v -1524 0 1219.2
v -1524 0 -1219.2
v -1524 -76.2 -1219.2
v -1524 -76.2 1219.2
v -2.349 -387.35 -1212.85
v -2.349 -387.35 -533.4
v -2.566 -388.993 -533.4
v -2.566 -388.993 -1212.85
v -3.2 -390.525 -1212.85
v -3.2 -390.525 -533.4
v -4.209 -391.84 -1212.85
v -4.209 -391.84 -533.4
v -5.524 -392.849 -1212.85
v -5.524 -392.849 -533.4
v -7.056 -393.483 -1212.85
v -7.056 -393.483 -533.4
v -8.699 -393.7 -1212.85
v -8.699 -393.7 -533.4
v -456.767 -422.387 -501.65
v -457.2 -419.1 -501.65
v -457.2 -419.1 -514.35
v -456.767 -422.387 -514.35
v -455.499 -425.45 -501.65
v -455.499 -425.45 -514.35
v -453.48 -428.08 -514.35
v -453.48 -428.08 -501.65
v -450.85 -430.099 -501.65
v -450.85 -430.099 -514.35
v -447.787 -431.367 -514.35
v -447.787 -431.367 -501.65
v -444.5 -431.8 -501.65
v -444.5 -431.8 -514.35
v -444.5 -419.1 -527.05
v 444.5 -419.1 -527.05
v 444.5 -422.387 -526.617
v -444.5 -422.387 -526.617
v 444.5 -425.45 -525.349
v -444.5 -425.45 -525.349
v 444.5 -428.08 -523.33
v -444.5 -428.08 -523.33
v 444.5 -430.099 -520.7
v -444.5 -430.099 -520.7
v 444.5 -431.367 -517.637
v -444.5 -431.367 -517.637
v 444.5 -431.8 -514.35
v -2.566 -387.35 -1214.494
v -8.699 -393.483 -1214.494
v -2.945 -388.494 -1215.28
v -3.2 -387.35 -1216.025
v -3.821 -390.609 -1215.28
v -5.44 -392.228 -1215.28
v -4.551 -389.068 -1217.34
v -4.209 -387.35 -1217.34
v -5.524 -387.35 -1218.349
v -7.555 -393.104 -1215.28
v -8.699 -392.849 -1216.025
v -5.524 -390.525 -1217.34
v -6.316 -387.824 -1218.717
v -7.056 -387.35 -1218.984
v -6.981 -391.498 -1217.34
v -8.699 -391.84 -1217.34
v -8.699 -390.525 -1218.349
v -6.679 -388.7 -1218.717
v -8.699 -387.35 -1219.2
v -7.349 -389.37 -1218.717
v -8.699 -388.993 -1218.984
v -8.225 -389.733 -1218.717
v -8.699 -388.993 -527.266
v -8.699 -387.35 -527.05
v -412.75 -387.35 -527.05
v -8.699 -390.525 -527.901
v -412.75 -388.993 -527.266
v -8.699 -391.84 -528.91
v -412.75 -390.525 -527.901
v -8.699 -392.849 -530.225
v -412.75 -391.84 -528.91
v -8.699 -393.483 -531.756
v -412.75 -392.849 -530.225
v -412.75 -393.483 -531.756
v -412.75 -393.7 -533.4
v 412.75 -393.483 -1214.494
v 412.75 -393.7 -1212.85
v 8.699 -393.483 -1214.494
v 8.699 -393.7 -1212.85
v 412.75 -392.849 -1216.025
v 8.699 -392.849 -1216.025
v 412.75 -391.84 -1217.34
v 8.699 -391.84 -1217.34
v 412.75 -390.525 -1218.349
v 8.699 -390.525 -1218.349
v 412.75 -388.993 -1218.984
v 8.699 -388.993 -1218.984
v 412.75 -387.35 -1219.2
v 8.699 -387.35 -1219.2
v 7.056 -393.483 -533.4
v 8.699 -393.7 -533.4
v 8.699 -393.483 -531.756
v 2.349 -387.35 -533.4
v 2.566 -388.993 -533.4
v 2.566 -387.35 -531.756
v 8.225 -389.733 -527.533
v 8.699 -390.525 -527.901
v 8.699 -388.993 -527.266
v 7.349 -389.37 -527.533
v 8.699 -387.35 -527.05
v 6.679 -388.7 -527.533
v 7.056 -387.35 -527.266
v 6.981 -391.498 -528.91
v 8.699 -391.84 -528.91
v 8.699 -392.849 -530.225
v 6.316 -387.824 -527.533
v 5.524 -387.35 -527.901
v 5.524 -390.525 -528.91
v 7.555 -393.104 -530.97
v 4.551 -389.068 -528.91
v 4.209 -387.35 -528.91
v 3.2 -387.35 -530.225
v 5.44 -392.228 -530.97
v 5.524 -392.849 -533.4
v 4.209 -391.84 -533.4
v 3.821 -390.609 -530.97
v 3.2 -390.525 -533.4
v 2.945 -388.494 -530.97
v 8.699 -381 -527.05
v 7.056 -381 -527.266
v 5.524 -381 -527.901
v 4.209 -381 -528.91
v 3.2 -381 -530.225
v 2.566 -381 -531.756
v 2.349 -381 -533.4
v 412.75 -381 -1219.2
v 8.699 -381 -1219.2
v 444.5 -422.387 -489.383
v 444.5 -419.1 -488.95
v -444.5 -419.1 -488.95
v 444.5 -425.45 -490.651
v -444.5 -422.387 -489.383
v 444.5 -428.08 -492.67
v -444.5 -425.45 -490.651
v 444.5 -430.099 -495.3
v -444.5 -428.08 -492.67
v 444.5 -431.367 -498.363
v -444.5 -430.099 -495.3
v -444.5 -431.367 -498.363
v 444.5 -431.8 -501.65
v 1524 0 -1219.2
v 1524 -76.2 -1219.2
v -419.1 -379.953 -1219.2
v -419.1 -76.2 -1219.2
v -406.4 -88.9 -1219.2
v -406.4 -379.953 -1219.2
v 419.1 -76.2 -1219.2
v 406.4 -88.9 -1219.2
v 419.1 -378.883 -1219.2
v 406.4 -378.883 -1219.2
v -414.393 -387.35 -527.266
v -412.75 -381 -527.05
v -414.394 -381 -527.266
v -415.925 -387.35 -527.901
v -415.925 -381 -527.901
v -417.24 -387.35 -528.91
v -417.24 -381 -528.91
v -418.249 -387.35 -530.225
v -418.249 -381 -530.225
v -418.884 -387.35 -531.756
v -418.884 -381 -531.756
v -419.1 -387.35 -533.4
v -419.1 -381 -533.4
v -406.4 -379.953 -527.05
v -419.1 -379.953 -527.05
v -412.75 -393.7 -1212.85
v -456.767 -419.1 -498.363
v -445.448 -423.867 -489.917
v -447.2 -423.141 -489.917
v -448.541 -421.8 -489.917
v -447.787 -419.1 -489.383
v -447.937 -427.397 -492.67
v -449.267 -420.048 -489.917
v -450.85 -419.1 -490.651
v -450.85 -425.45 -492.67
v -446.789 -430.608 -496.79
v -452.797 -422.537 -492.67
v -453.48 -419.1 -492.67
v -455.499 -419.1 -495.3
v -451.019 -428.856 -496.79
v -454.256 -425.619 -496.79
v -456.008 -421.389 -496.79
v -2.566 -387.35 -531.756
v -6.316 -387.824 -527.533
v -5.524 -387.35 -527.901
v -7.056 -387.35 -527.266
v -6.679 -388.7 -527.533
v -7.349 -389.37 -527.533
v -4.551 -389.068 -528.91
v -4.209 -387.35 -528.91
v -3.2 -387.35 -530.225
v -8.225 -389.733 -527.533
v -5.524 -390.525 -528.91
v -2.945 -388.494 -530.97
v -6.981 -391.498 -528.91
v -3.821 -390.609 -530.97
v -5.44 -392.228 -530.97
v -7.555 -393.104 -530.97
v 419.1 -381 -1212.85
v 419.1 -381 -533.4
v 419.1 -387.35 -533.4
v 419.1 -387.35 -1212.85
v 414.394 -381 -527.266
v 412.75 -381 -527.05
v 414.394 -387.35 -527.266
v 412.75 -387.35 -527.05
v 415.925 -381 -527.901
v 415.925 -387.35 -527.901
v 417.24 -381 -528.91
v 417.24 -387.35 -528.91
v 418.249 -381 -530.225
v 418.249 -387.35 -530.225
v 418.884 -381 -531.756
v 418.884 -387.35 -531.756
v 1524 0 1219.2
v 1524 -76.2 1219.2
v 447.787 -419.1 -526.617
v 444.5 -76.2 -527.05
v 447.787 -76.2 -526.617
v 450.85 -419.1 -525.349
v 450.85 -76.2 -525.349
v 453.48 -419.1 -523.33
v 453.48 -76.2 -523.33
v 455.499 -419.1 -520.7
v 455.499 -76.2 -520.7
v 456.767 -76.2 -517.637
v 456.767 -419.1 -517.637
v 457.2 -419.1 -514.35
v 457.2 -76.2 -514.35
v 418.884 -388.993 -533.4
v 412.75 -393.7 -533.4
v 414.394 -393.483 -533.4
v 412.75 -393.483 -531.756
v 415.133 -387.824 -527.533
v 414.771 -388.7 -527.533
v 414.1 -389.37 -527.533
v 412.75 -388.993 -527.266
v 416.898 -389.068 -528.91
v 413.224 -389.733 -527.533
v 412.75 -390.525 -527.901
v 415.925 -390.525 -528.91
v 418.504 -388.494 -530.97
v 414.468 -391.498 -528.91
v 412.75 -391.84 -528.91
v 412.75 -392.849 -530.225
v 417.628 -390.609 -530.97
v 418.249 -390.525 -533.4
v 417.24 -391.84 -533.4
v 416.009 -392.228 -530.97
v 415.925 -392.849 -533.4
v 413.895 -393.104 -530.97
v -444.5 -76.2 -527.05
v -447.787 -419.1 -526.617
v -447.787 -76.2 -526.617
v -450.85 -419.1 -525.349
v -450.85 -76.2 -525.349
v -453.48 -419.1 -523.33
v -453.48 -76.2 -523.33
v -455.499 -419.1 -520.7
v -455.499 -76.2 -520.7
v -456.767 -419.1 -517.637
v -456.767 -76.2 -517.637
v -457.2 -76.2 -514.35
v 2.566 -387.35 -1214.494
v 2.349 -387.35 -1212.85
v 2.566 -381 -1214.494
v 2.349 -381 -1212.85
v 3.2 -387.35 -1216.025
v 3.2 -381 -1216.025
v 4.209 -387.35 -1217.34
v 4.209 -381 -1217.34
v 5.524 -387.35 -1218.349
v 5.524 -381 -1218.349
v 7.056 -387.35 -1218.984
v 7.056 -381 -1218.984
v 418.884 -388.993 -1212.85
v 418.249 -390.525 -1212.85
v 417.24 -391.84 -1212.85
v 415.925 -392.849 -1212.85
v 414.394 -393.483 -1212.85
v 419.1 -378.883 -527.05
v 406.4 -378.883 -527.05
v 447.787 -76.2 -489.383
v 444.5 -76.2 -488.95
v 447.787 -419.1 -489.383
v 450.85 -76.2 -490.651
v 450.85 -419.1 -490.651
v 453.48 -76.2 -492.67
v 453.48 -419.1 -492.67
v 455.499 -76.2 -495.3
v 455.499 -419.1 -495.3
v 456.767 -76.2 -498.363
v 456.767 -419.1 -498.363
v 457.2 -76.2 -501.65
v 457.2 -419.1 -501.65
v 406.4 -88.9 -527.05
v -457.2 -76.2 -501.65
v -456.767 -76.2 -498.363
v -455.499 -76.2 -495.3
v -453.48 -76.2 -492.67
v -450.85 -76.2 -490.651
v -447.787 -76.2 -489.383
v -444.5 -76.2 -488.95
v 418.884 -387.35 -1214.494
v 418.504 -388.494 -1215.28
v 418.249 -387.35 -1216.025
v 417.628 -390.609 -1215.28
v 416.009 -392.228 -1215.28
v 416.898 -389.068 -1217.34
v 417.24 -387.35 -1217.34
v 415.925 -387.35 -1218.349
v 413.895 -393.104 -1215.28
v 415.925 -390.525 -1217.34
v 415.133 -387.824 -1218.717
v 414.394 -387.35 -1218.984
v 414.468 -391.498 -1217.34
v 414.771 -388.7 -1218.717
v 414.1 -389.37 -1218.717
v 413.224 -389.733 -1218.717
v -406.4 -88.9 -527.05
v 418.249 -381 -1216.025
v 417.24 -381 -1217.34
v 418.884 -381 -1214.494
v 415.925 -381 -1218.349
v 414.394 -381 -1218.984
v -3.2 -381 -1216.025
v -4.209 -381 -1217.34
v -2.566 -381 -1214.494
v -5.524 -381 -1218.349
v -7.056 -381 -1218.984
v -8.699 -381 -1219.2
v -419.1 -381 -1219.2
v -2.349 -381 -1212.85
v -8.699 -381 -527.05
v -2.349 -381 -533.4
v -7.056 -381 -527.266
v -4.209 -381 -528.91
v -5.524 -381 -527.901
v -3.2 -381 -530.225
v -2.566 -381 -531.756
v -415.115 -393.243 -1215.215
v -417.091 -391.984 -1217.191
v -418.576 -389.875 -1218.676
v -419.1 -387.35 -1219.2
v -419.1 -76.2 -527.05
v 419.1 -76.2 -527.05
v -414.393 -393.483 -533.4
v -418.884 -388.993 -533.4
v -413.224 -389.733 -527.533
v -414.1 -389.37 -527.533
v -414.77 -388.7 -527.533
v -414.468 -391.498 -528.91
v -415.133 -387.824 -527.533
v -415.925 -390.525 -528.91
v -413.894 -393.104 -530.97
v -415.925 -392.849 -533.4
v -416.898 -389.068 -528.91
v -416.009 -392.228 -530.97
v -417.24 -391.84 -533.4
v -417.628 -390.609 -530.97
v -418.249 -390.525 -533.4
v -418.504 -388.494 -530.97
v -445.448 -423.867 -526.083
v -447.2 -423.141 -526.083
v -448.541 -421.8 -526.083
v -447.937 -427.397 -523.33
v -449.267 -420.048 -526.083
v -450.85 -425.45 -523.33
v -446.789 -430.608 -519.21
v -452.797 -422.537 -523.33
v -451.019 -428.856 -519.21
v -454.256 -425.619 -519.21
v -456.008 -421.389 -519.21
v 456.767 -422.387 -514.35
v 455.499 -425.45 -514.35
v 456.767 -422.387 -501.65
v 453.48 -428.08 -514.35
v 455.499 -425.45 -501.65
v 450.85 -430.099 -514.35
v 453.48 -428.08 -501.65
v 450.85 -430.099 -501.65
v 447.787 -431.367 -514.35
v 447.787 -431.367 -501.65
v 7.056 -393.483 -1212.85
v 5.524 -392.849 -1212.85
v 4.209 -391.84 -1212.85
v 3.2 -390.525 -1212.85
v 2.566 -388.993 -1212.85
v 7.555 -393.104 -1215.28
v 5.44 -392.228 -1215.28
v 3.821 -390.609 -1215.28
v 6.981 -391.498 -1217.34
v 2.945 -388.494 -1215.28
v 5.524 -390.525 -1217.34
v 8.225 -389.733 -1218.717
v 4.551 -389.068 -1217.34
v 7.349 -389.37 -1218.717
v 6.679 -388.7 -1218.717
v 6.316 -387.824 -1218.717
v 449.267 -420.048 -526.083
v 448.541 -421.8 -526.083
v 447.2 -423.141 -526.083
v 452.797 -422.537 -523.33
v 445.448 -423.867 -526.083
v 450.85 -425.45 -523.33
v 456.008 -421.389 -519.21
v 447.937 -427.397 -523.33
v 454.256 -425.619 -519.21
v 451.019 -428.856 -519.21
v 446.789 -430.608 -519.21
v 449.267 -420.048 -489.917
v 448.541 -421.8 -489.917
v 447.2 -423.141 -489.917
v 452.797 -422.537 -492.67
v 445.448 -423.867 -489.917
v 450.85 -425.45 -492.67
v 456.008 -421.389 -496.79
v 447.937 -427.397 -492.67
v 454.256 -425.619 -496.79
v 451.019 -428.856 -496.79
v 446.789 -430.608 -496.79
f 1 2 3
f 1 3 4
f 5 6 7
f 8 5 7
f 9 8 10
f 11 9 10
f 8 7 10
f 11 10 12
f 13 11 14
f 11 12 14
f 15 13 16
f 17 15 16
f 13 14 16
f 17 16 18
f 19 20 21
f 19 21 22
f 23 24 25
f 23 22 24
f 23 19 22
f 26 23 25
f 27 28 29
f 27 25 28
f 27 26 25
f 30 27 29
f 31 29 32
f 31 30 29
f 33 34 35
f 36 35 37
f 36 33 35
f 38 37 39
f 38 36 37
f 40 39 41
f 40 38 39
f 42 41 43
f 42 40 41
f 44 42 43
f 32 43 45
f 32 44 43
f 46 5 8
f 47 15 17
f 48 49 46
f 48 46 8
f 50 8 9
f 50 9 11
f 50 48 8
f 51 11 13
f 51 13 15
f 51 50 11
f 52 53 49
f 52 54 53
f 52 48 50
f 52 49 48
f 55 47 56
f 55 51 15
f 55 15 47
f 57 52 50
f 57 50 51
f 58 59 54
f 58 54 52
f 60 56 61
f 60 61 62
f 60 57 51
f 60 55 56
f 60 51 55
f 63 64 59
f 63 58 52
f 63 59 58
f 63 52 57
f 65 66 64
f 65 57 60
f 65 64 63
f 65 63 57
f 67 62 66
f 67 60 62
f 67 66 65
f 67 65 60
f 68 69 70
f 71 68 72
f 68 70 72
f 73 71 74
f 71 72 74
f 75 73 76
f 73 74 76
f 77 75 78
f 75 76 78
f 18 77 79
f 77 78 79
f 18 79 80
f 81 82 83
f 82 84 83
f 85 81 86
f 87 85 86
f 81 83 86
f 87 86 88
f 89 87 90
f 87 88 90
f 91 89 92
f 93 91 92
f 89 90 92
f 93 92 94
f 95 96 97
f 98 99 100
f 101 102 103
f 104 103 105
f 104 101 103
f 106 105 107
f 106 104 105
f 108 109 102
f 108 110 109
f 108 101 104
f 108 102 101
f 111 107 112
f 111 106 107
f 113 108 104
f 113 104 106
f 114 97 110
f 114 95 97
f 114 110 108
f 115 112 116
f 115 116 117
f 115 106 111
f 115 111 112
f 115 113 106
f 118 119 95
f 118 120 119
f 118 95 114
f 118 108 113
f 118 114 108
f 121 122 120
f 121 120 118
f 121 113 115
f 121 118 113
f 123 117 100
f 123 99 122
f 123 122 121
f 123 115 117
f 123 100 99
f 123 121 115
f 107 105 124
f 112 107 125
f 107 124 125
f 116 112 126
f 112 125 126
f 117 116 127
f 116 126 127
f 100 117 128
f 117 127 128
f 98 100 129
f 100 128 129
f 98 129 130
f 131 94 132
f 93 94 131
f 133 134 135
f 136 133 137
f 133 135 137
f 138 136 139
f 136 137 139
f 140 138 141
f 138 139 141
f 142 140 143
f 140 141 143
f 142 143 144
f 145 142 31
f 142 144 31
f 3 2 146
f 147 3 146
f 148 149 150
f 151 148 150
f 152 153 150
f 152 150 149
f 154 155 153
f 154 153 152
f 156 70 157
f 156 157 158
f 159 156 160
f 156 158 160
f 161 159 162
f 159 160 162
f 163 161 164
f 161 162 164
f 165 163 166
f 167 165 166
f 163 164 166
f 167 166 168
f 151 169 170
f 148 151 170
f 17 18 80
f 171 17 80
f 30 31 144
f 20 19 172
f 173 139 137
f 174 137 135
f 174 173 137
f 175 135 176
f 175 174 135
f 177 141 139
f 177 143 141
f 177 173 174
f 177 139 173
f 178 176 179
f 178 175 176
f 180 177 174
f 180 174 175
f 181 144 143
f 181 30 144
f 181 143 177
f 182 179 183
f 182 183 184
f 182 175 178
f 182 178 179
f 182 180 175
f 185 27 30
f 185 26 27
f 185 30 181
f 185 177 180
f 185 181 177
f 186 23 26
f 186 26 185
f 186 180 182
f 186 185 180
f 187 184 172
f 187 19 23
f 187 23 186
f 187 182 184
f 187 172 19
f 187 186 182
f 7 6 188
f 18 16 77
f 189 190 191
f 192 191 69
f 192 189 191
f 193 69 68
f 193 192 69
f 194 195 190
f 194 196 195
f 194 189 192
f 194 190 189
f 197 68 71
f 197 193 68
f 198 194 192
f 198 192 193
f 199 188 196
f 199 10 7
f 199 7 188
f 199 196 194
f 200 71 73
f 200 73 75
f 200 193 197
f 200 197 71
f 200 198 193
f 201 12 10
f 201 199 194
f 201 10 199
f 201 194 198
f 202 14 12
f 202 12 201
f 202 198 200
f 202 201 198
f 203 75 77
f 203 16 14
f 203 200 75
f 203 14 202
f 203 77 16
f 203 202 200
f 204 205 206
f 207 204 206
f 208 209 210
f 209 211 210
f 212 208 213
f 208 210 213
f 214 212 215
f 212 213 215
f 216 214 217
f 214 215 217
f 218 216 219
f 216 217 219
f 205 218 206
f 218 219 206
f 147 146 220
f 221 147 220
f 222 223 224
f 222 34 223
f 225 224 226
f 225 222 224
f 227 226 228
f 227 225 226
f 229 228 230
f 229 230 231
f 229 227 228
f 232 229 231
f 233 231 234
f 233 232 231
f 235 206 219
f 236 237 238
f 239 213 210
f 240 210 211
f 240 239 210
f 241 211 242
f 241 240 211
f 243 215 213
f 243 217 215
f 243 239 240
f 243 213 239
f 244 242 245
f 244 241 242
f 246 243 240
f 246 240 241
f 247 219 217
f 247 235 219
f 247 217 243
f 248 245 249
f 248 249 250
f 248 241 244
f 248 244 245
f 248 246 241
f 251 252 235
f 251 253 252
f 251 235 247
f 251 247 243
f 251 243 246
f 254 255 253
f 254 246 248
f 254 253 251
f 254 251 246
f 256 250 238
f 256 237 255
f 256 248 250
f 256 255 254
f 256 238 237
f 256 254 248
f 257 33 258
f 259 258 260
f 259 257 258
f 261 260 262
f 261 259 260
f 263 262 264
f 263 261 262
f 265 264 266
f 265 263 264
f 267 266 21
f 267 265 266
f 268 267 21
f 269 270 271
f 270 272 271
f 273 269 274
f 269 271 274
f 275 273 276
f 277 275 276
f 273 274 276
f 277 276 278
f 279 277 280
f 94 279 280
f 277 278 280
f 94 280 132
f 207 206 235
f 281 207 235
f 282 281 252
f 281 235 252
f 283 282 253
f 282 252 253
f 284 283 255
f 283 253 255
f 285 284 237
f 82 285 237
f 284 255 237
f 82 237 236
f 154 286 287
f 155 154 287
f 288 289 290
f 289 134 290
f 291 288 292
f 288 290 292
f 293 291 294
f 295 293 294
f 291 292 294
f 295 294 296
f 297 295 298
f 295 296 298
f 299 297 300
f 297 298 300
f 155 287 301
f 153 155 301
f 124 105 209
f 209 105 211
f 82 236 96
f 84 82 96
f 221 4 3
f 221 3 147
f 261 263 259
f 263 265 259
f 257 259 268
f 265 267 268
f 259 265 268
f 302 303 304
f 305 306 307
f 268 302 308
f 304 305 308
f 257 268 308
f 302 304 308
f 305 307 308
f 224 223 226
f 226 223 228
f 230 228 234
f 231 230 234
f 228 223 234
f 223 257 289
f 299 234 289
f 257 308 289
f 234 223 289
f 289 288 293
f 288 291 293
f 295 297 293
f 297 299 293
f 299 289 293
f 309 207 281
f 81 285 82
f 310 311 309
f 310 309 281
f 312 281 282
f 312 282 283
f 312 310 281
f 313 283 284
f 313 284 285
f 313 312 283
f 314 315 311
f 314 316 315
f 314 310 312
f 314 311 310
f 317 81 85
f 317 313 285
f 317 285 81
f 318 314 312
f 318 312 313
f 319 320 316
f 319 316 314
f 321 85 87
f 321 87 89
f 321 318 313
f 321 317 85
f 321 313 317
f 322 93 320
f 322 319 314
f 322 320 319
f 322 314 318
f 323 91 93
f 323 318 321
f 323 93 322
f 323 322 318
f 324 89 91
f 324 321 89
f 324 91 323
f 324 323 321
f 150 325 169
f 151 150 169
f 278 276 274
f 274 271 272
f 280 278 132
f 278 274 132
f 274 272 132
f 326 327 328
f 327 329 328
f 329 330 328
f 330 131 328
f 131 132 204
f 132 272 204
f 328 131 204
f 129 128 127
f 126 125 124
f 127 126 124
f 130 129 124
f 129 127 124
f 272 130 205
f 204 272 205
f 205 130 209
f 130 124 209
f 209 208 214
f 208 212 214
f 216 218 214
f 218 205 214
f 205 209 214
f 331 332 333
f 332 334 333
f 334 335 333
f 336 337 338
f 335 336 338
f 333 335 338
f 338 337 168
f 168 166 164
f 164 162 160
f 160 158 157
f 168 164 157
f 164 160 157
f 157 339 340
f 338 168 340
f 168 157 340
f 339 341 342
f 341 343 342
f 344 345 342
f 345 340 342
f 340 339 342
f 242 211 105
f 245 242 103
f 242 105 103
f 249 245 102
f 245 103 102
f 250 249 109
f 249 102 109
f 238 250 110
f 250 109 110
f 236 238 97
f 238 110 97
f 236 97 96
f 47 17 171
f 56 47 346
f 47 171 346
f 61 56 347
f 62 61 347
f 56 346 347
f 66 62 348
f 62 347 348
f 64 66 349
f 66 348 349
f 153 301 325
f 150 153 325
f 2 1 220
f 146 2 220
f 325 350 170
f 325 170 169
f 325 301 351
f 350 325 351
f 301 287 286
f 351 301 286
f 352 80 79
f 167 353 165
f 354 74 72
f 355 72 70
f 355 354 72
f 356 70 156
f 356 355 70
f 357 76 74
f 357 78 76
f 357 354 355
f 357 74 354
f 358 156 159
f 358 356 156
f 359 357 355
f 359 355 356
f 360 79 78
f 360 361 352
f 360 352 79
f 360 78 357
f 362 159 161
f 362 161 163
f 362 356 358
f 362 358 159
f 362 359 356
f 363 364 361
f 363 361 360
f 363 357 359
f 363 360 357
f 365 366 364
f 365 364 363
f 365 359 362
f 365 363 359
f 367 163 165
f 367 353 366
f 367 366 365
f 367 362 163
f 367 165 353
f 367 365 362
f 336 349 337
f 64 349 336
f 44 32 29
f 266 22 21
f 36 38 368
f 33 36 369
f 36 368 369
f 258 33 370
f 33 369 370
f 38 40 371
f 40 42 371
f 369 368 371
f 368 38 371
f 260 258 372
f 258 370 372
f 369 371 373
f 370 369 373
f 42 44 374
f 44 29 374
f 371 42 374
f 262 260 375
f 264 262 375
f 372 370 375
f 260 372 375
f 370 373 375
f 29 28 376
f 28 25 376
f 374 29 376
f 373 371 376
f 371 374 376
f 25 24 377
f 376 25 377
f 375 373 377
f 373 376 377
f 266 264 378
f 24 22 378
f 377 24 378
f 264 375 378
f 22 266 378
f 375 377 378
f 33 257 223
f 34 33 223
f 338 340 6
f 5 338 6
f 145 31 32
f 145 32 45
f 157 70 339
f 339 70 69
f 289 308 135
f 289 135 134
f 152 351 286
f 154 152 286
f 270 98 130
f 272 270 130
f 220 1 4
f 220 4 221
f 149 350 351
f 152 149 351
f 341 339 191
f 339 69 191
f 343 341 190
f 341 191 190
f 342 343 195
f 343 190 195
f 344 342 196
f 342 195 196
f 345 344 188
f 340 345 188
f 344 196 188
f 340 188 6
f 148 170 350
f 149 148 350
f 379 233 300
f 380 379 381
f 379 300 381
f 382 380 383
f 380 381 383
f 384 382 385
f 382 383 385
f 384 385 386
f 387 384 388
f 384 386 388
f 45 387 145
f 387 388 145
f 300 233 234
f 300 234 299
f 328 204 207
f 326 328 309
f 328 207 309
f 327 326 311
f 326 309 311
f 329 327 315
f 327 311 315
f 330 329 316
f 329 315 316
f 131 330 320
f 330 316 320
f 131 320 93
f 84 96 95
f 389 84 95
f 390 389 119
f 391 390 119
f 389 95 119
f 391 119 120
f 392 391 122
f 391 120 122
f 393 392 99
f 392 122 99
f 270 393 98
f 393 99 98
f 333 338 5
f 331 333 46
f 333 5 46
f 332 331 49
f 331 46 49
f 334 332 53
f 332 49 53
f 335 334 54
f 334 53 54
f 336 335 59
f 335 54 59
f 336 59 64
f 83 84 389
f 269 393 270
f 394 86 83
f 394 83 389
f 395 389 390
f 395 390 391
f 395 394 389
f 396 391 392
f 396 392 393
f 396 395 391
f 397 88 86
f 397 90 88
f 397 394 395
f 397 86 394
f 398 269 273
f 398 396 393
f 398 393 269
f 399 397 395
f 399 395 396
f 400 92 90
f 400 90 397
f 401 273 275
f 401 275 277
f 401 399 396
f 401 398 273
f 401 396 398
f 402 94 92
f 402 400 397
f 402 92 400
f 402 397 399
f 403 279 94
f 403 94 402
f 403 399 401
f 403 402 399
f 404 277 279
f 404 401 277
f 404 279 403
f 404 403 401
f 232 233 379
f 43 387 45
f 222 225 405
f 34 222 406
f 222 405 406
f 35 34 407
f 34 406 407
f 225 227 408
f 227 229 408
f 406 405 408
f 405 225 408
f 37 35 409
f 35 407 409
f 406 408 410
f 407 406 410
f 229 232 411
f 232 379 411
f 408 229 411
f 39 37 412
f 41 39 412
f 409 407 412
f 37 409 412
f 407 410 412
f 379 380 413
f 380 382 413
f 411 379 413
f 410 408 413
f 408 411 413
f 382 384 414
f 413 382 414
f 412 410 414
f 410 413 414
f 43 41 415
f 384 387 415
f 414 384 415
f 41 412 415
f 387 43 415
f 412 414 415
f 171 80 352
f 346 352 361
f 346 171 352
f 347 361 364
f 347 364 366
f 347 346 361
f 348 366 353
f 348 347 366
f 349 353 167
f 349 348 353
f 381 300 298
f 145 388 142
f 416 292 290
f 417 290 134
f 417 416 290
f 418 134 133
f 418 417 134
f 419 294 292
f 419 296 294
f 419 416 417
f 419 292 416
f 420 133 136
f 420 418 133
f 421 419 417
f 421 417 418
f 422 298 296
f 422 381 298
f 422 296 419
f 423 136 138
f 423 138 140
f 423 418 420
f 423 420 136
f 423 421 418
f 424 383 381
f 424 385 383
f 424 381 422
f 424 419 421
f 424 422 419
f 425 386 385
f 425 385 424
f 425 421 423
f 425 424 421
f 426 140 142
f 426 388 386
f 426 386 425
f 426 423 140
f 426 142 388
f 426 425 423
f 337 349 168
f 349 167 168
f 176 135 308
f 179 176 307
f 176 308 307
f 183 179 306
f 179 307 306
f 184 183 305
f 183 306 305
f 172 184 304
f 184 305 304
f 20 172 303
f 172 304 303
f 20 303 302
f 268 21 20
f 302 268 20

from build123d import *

# Parameters (mm, degrees)
F0_W     = 3048
F0_H     = 2438.4
F1_DEPTH = 76.2
F2_W     = 914.4
F2_H     = 38.1
F3_DEPTH = 355.6
F4_R     = 12.7
F5_R     = 12.7
F7_DEPTH = 692.15
F8_R     = 6.35
F8_2_R   = 6.35
F9_R     = 6.35
F9_2_R   = 6.35


# Not quite as in the source:
# - ends of sketch curves that miss each other by under 0.0002 mm in the source are joined


with BuildPart() as f1:
    # F0 (on Front) → F1 (new body)
    with BuildSketch(Plane.XZ):
        Rectangle(F0_W, F0_H)
    extrude(amount=F1_DEPTH)


with BuildPart() as f3:
    # F2 (on face) → F3 (new body)
    with BuildSketch(Plane.XZ.offset(76.2)):
        with Locations((0, -508)):
            Rectangle(F2_W, F2_H)
    extrude(amount=F3_DEPTH)

    # F4
    f4_edges = [f3.edges().sort_by_distance(p)[0] for p in [
        (457.2, -431.8, -508),
        (-457.2, -431.8, -508),
    ]]
    fillet(f4_edges, radius=F4_R)

    # F5
    f5_edges = [f3.edges().sort_by_distance(p)[0] for p in [
        (457.2, -247.65, -488.95),
        (457.2, -247.65, -527.05),
        (0, -431.8, -488.95),
        (0, -431.8, -527.05),
        (-457.2, -247.65, -488.95),
        (-457.2, -247.65, -527.05),
    ]]
    fillet(f5_edges, radius=F5_R)


with BuildPart() as f7:
    # F6 (on face) → F7 (new body)
    with BuildSketch(Plane(origin=(0, 0, -527.05), x_dir=(1, 0, 0), z_dir=(0, 0, -1))):
        Polygon((-419.1, 379.9533247948), (-419.1, 76.2), (419.1, 76.2), (419.100077045, 378.8828551769), (406.400077045, 378.8828551769), (406.400077045, 88.8998284936), (-406.3999652863, 88.8998284936), (-406.3999652863, 379.9533247948), align=None)
    extrude(amount=F7_DEPTH)


with BuildPart() as f7b:
    # F6 (on face) → F7, piece 2 (new body)
    with BuildSketch(Plane(origin=(0, 0, -527.05), x_dir=(1, 0, 0), z_dir=(0, 0, -1))):
        with BuildLine():
            Line((-419.1, 380.9998109937), (-406.3999652863, 380.9998109937))
            Line((-406.3999652863, 380.9998109937), (-2.349158771, 380.9998109937))
            Line((-2.349158771, 380.9998109937), (-2.349158771, 387.3498109937))
            ThreePointArc((-2.349158771, 387.3498109937), (-4.2090307104, 391.8399390542), (-8.699158771, 393.6998109937))
            Line((-8.699158771, 393.6998109937), (-419.099922955, 393.6998109937))
            Line((-419.099922955, 393.6998109937), (-419.1, 380.9998109937))
        make_face()
    extrude(amount=F7_DEPTH)

    # F8#2
    f8_2_edges = [f7b.edges().sort_by_distance(p)[0] for p in [
        (-213.899541, -393.699811, -1219.2),
        (-419.099923, -393.699811, -873.125),
    ]]
    fillet(f8_2_edges, radius=F8_2_R)

    # F9
    f9_edges = [f7b.edges().sort_by_distance(p)[0] for p in [
        (-210.72456, -393.699811, -527.05),
    ]]
    fillet(f9_edges, radius=F9_R)


with BuildPart() as f7c:
    # F6 (on face) → F7, piece 3 (new body)
    with BuildSketch(Plane(origin=(0, 0, -527.05), x_dir=(1, 0, 0), z_dir=(0, 0, -1))):
        with BuildLine():
            Line((419.100077045, 380.9998109937), (419.100077045, 387.3498109937))
            ThreePointArc((419.100077045, 387.3498109937), (417.2402051055, 391.8399390542), (412.750077045, 393.6998109937))
            Line((412.750077045, 393.6998109937), (8.6992916953, 393.6998109937))
            ThreePointArc((8.6992916953, 393.6998109937), (4.2091636347, 391.8399390542), (2.3492916953, 387.3498109937))
            Line((2.3492916953, 387.3498109937), (2.3492916953, 380.9998109937))
            Line((2.3492916953, 380.9998109937), (406.400077045, 380.9998109937))
            Line((406.400077045, 380.9998109937), (419.100077045, 380.9998109937))
        make_face()
    extrude(amount=F7_DEPTH)

    # F8
    f8_edges = [f7c.edges().sort_by_distance(p)[0] for p in [
        (210.724684, -393.699811, -1219.2),
    ]]
    fillet(f8_edges, radius=F8_R)

    # F9#2
    f9_2_edges = [f7c.edges().sort_by_distance(p)[0] for p in [
        (210.724684, -393.699811, -527.05),
    ]]
    fillet(f9_2_edges, radius=F9_2_R)


solid = Compound([f1.part, f3.part, f7.part, f7b.part, f7c.part])
